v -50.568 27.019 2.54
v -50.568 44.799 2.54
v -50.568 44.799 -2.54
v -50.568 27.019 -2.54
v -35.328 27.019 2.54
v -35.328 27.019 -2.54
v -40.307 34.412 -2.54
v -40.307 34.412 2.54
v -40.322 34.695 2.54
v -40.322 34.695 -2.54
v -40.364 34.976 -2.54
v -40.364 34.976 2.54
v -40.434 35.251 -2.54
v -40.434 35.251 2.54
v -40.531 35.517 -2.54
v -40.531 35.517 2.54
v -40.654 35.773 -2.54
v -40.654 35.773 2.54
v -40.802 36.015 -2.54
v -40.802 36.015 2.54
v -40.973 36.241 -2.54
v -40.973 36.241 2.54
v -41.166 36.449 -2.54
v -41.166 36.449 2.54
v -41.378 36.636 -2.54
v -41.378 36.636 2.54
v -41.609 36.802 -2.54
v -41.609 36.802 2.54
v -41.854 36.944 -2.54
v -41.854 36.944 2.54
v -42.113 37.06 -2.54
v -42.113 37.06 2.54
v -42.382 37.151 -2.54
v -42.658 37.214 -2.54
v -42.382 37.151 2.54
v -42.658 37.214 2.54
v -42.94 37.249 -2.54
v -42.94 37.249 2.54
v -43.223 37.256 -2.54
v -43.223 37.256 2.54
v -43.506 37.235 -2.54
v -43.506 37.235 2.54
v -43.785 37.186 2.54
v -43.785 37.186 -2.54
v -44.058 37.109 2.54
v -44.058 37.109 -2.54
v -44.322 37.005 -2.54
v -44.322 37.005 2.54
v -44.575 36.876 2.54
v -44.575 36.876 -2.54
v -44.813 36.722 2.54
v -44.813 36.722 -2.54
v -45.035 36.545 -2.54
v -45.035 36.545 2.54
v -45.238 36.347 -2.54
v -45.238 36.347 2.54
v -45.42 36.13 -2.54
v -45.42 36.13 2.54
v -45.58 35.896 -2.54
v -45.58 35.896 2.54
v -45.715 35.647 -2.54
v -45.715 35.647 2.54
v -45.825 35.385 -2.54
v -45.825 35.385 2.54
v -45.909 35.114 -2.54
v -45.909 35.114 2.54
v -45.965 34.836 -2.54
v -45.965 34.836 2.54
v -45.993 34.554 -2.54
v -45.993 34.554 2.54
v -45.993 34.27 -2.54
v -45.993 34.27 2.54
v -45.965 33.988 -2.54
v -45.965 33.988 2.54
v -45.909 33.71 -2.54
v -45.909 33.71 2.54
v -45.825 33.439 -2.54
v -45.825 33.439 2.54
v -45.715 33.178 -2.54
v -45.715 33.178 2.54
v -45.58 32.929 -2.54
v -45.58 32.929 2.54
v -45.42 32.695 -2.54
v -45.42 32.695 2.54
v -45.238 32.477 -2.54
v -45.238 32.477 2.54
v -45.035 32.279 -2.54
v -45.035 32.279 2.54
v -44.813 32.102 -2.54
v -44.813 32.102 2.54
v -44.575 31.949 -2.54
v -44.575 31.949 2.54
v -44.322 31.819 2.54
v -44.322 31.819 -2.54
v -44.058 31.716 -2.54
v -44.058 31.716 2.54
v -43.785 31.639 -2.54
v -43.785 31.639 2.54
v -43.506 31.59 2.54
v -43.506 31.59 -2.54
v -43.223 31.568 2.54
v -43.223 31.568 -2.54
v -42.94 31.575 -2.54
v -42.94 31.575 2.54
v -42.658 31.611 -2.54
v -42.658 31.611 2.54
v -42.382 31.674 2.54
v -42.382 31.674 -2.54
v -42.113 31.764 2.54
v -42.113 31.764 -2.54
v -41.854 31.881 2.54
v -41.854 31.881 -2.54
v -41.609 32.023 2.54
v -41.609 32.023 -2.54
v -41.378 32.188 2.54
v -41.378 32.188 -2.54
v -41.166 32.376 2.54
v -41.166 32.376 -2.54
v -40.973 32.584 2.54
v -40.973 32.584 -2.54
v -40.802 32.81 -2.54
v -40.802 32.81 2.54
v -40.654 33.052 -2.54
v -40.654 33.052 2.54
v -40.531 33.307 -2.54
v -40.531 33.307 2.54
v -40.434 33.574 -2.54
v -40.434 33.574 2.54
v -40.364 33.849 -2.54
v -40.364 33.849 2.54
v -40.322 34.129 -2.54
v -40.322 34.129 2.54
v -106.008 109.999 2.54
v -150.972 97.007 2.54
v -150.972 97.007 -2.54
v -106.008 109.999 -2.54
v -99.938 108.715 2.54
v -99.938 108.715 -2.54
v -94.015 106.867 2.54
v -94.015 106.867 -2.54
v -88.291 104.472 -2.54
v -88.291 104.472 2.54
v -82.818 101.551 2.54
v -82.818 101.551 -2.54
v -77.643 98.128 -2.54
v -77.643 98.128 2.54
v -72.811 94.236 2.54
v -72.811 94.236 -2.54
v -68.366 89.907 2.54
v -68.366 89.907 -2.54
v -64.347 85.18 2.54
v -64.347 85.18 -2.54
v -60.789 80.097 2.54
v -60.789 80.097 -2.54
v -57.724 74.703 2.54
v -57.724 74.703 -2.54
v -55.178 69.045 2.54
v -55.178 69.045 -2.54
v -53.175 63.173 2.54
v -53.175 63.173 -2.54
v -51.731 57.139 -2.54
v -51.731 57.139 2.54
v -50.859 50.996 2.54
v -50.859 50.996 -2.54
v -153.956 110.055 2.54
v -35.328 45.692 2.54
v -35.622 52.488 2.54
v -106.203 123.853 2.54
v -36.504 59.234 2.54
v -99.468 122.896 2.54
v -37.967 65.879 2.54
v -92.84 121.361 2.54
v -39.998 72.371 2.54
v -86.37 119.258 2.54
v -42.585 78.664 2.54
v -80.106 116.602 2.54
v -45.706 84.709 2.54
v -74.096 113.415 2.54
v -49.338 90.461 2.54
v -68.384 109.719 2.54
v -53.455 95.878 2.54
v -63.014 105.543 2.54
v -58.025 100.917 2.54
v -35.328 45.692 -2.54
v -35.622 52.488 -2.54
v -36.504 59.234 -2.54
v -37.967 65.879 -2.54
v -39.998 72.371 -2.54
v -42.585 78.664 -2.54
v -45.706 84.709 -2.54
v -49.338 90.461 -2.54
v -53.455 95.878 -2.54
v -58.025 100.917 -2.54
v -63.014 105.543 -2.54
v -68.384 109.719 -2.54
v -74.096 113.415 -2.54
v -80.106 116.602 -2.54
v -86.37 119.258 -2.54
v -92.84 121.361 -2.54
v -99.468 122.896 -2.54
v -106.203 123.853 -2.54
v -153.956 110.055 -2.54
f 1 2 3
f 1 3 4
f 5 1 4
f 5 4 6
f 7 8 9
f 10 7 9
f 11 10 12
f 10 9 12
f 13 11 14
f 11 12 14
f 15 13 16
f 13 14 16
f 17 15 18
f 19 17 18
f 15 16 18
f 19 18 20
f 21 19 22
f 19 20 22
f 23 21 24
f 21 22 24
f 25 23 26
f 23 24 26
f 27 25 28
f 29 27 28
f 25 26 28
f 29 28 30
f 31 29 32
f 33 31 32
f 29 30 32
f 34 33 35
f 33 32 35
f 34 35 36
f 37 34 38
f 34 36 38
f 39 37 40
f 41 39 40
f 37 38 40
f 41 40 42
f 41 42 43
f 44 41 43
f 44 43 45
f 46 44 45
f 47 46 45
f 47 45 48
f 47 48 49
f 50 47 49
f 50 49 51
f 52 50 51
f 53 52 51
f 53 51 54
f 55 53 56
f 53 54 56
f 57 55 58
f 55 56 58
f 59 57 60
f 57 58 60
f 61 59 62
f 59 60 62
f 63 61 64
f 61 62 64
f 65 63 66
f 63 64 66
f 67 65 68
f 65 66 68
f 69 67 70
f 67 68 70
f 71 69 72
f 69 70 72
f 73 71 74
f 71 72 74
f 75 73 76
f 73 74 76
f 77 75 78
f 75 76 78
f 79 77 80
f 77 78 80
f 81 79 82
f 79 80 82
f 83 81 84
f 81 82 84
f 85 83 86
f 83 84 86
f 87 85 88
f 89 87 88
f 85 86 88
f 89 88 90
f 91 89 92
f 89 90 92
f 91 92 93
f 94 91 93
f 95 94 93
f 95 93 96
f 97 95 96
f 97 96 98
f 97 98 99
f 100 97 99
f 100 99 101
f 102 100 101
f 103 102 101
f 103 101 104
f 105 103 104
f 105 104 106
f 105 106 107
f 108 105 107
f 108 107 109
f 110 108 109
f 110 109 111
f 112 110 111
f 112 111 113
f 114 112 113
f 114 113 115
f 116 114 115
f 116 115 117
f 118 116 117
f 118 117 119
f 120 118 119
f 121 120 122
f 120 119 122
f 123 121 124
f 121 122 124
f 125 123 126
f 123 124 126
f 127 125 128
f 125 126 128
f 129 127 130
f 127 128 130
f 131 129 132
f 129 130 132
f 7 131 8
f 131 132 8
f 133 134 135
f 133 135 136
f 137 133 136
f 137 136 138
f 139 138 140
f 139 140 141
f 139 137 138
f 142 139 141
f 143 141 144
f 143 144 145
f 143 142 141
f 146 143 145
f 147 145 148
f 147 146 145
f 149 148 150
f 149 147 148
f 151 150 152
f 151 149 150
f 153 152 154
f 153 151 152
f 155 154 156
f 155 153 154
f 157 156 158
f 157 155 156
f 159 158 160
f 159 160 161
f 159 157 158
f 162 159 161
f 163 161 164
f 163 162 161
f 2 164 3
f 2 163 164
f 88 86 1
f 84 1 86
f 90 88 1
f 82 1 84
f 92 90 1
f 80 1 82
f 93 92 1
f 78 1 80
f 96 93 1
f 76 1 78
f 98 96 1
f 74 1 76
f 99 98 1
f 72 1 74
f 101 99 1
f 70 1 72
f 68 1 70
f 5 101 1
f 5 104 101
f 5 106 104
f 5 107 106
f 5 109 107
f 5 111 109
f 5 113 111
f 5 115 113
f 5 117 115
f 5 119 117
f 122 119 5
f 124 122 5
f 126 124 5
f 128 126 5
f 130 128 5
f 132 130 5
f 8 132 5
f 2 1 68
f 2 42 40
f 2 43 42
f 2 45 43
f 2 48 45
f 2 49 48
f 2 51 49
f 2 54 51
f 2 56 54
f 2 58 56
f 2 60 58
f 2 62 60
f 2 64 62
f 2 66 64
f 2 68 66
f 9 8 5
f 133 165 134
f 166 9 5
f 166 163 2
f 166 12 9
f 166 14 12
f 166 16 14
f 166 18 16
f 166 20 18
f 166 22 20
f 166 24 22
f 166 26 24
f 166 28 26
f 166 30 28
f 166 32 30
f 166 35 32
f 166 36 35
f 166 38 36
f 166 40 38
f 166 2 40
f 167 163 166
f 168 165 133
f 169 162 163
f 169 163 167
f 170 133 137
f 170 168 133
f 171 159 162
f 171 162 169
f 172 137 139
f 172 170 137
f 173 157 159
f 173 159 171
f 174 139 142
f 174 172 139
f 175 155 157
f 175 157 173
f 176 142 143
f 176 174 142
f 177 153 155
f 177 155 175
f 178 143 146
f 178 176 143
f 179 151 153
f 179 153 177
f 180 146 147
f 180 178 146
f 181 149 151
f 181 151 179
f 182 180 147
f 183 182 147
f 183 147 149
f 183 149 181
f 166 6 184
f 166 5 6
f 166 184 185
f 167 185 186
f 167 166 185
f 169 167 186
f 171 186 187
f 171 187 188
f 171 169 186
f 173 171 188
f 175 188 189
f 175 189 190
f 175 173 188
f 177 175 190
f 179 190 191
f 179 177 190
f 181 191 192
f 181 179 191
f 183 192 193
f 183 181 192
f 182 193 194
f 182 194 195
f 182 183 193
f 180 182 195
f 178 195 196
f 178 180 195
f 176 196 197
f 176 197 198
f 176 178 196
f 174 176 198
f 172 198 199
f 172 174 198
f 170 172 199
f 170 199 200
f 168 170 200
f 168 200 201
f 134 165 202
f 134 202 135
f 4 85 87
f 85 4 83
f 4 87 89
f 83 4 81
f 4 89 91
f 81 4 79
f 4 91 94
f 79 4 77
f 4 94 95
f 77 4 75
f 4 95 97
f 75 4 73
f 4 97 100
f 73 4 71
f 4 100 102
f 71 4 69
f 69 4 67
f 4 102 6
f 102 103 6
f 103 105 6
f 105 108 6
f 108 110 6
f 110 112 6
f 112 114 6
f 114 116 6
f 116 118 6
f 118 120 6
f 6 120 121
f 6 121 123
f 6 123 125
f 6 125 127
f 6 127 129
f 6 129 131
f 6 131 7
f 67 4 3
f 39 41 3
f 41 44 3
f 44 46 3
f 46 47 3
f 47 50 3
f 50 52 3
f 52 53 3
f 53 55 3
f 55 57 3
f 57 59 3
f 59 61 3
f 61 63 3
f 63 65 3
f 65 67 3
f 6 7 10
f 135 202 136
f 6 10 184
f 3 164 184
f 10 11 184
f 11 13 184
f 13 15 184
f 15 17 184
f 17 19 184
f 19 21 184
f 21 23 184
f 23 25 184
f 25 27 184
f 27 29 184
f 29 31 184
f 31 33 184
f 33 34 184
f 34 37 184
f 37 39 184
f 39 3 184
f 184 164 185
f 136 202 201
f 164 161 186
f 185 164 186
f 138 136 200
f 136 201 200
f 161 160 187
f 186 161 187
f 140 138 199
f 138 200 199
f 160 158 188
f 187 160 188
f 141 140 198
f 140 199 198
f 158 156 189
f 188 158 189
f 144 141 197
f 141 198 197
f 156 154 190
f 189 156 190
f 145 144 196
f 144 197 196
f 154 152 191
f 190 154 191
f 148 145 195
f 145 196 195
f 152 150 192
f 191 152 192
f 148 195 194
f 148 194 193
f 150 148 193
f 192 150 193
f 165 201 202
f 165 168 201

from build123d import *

# Parameters (mm, degrees)
BOSS_EXTRUDE1_DEPTH = 2.54
SKETCH2_R           = 2.8448
CUT_EXTRUDE1_DEPTH  = 5.08


with BuildPart() as part:
    # Sketch1 → Boss-Extrude1 (new body, symmetric)
    with BuildSketch(Plane.XY):
        with BuildLine():
            Line((-106.203198828, 123.8526304), (-153.956362537, 110.054547529))
            Line((-153.956362537, 110.054547529), (-150.972399128, 97.006641248))
            Line((-150.972399128, 97.006641248), (-106.007662429, 109.999019449))
            ThreePointArc((-106.007662429, 109.999019449), (-66.301425243, 87.590832017), (-50.567785145, 44.798721708))
            Line((-50.567785145, 44.798721708), (-50.567785145, 27.018721708))
            Line((-50.567785145, 27.018721708), (-35.327785145, 27.018721708))
            Line((-35.327785145, 27.018721708), (-35.327785145, 45.691652598))
            ThreePointArc((-35.327785145, 45.691652598), (-55.685055667, 98.44689574), (-106.203198828, 123.8526304))
        make_face()
    extrude(amount=BOSS_EXTRUDE1_DEPTH, both=True)

    # Sketch2 → Cut-Extrude1 (cut)
    with BuildSketch(Plane.XY.offset(2.54)):
        with Locations((-43.152202962, 34.412244361)):
            Circle(SKETCH2_R)
    extrude(amount=-CUT_EXTRUDE1_DEPTH, mode=Mode.SUBTRACT)


solid = part.part
